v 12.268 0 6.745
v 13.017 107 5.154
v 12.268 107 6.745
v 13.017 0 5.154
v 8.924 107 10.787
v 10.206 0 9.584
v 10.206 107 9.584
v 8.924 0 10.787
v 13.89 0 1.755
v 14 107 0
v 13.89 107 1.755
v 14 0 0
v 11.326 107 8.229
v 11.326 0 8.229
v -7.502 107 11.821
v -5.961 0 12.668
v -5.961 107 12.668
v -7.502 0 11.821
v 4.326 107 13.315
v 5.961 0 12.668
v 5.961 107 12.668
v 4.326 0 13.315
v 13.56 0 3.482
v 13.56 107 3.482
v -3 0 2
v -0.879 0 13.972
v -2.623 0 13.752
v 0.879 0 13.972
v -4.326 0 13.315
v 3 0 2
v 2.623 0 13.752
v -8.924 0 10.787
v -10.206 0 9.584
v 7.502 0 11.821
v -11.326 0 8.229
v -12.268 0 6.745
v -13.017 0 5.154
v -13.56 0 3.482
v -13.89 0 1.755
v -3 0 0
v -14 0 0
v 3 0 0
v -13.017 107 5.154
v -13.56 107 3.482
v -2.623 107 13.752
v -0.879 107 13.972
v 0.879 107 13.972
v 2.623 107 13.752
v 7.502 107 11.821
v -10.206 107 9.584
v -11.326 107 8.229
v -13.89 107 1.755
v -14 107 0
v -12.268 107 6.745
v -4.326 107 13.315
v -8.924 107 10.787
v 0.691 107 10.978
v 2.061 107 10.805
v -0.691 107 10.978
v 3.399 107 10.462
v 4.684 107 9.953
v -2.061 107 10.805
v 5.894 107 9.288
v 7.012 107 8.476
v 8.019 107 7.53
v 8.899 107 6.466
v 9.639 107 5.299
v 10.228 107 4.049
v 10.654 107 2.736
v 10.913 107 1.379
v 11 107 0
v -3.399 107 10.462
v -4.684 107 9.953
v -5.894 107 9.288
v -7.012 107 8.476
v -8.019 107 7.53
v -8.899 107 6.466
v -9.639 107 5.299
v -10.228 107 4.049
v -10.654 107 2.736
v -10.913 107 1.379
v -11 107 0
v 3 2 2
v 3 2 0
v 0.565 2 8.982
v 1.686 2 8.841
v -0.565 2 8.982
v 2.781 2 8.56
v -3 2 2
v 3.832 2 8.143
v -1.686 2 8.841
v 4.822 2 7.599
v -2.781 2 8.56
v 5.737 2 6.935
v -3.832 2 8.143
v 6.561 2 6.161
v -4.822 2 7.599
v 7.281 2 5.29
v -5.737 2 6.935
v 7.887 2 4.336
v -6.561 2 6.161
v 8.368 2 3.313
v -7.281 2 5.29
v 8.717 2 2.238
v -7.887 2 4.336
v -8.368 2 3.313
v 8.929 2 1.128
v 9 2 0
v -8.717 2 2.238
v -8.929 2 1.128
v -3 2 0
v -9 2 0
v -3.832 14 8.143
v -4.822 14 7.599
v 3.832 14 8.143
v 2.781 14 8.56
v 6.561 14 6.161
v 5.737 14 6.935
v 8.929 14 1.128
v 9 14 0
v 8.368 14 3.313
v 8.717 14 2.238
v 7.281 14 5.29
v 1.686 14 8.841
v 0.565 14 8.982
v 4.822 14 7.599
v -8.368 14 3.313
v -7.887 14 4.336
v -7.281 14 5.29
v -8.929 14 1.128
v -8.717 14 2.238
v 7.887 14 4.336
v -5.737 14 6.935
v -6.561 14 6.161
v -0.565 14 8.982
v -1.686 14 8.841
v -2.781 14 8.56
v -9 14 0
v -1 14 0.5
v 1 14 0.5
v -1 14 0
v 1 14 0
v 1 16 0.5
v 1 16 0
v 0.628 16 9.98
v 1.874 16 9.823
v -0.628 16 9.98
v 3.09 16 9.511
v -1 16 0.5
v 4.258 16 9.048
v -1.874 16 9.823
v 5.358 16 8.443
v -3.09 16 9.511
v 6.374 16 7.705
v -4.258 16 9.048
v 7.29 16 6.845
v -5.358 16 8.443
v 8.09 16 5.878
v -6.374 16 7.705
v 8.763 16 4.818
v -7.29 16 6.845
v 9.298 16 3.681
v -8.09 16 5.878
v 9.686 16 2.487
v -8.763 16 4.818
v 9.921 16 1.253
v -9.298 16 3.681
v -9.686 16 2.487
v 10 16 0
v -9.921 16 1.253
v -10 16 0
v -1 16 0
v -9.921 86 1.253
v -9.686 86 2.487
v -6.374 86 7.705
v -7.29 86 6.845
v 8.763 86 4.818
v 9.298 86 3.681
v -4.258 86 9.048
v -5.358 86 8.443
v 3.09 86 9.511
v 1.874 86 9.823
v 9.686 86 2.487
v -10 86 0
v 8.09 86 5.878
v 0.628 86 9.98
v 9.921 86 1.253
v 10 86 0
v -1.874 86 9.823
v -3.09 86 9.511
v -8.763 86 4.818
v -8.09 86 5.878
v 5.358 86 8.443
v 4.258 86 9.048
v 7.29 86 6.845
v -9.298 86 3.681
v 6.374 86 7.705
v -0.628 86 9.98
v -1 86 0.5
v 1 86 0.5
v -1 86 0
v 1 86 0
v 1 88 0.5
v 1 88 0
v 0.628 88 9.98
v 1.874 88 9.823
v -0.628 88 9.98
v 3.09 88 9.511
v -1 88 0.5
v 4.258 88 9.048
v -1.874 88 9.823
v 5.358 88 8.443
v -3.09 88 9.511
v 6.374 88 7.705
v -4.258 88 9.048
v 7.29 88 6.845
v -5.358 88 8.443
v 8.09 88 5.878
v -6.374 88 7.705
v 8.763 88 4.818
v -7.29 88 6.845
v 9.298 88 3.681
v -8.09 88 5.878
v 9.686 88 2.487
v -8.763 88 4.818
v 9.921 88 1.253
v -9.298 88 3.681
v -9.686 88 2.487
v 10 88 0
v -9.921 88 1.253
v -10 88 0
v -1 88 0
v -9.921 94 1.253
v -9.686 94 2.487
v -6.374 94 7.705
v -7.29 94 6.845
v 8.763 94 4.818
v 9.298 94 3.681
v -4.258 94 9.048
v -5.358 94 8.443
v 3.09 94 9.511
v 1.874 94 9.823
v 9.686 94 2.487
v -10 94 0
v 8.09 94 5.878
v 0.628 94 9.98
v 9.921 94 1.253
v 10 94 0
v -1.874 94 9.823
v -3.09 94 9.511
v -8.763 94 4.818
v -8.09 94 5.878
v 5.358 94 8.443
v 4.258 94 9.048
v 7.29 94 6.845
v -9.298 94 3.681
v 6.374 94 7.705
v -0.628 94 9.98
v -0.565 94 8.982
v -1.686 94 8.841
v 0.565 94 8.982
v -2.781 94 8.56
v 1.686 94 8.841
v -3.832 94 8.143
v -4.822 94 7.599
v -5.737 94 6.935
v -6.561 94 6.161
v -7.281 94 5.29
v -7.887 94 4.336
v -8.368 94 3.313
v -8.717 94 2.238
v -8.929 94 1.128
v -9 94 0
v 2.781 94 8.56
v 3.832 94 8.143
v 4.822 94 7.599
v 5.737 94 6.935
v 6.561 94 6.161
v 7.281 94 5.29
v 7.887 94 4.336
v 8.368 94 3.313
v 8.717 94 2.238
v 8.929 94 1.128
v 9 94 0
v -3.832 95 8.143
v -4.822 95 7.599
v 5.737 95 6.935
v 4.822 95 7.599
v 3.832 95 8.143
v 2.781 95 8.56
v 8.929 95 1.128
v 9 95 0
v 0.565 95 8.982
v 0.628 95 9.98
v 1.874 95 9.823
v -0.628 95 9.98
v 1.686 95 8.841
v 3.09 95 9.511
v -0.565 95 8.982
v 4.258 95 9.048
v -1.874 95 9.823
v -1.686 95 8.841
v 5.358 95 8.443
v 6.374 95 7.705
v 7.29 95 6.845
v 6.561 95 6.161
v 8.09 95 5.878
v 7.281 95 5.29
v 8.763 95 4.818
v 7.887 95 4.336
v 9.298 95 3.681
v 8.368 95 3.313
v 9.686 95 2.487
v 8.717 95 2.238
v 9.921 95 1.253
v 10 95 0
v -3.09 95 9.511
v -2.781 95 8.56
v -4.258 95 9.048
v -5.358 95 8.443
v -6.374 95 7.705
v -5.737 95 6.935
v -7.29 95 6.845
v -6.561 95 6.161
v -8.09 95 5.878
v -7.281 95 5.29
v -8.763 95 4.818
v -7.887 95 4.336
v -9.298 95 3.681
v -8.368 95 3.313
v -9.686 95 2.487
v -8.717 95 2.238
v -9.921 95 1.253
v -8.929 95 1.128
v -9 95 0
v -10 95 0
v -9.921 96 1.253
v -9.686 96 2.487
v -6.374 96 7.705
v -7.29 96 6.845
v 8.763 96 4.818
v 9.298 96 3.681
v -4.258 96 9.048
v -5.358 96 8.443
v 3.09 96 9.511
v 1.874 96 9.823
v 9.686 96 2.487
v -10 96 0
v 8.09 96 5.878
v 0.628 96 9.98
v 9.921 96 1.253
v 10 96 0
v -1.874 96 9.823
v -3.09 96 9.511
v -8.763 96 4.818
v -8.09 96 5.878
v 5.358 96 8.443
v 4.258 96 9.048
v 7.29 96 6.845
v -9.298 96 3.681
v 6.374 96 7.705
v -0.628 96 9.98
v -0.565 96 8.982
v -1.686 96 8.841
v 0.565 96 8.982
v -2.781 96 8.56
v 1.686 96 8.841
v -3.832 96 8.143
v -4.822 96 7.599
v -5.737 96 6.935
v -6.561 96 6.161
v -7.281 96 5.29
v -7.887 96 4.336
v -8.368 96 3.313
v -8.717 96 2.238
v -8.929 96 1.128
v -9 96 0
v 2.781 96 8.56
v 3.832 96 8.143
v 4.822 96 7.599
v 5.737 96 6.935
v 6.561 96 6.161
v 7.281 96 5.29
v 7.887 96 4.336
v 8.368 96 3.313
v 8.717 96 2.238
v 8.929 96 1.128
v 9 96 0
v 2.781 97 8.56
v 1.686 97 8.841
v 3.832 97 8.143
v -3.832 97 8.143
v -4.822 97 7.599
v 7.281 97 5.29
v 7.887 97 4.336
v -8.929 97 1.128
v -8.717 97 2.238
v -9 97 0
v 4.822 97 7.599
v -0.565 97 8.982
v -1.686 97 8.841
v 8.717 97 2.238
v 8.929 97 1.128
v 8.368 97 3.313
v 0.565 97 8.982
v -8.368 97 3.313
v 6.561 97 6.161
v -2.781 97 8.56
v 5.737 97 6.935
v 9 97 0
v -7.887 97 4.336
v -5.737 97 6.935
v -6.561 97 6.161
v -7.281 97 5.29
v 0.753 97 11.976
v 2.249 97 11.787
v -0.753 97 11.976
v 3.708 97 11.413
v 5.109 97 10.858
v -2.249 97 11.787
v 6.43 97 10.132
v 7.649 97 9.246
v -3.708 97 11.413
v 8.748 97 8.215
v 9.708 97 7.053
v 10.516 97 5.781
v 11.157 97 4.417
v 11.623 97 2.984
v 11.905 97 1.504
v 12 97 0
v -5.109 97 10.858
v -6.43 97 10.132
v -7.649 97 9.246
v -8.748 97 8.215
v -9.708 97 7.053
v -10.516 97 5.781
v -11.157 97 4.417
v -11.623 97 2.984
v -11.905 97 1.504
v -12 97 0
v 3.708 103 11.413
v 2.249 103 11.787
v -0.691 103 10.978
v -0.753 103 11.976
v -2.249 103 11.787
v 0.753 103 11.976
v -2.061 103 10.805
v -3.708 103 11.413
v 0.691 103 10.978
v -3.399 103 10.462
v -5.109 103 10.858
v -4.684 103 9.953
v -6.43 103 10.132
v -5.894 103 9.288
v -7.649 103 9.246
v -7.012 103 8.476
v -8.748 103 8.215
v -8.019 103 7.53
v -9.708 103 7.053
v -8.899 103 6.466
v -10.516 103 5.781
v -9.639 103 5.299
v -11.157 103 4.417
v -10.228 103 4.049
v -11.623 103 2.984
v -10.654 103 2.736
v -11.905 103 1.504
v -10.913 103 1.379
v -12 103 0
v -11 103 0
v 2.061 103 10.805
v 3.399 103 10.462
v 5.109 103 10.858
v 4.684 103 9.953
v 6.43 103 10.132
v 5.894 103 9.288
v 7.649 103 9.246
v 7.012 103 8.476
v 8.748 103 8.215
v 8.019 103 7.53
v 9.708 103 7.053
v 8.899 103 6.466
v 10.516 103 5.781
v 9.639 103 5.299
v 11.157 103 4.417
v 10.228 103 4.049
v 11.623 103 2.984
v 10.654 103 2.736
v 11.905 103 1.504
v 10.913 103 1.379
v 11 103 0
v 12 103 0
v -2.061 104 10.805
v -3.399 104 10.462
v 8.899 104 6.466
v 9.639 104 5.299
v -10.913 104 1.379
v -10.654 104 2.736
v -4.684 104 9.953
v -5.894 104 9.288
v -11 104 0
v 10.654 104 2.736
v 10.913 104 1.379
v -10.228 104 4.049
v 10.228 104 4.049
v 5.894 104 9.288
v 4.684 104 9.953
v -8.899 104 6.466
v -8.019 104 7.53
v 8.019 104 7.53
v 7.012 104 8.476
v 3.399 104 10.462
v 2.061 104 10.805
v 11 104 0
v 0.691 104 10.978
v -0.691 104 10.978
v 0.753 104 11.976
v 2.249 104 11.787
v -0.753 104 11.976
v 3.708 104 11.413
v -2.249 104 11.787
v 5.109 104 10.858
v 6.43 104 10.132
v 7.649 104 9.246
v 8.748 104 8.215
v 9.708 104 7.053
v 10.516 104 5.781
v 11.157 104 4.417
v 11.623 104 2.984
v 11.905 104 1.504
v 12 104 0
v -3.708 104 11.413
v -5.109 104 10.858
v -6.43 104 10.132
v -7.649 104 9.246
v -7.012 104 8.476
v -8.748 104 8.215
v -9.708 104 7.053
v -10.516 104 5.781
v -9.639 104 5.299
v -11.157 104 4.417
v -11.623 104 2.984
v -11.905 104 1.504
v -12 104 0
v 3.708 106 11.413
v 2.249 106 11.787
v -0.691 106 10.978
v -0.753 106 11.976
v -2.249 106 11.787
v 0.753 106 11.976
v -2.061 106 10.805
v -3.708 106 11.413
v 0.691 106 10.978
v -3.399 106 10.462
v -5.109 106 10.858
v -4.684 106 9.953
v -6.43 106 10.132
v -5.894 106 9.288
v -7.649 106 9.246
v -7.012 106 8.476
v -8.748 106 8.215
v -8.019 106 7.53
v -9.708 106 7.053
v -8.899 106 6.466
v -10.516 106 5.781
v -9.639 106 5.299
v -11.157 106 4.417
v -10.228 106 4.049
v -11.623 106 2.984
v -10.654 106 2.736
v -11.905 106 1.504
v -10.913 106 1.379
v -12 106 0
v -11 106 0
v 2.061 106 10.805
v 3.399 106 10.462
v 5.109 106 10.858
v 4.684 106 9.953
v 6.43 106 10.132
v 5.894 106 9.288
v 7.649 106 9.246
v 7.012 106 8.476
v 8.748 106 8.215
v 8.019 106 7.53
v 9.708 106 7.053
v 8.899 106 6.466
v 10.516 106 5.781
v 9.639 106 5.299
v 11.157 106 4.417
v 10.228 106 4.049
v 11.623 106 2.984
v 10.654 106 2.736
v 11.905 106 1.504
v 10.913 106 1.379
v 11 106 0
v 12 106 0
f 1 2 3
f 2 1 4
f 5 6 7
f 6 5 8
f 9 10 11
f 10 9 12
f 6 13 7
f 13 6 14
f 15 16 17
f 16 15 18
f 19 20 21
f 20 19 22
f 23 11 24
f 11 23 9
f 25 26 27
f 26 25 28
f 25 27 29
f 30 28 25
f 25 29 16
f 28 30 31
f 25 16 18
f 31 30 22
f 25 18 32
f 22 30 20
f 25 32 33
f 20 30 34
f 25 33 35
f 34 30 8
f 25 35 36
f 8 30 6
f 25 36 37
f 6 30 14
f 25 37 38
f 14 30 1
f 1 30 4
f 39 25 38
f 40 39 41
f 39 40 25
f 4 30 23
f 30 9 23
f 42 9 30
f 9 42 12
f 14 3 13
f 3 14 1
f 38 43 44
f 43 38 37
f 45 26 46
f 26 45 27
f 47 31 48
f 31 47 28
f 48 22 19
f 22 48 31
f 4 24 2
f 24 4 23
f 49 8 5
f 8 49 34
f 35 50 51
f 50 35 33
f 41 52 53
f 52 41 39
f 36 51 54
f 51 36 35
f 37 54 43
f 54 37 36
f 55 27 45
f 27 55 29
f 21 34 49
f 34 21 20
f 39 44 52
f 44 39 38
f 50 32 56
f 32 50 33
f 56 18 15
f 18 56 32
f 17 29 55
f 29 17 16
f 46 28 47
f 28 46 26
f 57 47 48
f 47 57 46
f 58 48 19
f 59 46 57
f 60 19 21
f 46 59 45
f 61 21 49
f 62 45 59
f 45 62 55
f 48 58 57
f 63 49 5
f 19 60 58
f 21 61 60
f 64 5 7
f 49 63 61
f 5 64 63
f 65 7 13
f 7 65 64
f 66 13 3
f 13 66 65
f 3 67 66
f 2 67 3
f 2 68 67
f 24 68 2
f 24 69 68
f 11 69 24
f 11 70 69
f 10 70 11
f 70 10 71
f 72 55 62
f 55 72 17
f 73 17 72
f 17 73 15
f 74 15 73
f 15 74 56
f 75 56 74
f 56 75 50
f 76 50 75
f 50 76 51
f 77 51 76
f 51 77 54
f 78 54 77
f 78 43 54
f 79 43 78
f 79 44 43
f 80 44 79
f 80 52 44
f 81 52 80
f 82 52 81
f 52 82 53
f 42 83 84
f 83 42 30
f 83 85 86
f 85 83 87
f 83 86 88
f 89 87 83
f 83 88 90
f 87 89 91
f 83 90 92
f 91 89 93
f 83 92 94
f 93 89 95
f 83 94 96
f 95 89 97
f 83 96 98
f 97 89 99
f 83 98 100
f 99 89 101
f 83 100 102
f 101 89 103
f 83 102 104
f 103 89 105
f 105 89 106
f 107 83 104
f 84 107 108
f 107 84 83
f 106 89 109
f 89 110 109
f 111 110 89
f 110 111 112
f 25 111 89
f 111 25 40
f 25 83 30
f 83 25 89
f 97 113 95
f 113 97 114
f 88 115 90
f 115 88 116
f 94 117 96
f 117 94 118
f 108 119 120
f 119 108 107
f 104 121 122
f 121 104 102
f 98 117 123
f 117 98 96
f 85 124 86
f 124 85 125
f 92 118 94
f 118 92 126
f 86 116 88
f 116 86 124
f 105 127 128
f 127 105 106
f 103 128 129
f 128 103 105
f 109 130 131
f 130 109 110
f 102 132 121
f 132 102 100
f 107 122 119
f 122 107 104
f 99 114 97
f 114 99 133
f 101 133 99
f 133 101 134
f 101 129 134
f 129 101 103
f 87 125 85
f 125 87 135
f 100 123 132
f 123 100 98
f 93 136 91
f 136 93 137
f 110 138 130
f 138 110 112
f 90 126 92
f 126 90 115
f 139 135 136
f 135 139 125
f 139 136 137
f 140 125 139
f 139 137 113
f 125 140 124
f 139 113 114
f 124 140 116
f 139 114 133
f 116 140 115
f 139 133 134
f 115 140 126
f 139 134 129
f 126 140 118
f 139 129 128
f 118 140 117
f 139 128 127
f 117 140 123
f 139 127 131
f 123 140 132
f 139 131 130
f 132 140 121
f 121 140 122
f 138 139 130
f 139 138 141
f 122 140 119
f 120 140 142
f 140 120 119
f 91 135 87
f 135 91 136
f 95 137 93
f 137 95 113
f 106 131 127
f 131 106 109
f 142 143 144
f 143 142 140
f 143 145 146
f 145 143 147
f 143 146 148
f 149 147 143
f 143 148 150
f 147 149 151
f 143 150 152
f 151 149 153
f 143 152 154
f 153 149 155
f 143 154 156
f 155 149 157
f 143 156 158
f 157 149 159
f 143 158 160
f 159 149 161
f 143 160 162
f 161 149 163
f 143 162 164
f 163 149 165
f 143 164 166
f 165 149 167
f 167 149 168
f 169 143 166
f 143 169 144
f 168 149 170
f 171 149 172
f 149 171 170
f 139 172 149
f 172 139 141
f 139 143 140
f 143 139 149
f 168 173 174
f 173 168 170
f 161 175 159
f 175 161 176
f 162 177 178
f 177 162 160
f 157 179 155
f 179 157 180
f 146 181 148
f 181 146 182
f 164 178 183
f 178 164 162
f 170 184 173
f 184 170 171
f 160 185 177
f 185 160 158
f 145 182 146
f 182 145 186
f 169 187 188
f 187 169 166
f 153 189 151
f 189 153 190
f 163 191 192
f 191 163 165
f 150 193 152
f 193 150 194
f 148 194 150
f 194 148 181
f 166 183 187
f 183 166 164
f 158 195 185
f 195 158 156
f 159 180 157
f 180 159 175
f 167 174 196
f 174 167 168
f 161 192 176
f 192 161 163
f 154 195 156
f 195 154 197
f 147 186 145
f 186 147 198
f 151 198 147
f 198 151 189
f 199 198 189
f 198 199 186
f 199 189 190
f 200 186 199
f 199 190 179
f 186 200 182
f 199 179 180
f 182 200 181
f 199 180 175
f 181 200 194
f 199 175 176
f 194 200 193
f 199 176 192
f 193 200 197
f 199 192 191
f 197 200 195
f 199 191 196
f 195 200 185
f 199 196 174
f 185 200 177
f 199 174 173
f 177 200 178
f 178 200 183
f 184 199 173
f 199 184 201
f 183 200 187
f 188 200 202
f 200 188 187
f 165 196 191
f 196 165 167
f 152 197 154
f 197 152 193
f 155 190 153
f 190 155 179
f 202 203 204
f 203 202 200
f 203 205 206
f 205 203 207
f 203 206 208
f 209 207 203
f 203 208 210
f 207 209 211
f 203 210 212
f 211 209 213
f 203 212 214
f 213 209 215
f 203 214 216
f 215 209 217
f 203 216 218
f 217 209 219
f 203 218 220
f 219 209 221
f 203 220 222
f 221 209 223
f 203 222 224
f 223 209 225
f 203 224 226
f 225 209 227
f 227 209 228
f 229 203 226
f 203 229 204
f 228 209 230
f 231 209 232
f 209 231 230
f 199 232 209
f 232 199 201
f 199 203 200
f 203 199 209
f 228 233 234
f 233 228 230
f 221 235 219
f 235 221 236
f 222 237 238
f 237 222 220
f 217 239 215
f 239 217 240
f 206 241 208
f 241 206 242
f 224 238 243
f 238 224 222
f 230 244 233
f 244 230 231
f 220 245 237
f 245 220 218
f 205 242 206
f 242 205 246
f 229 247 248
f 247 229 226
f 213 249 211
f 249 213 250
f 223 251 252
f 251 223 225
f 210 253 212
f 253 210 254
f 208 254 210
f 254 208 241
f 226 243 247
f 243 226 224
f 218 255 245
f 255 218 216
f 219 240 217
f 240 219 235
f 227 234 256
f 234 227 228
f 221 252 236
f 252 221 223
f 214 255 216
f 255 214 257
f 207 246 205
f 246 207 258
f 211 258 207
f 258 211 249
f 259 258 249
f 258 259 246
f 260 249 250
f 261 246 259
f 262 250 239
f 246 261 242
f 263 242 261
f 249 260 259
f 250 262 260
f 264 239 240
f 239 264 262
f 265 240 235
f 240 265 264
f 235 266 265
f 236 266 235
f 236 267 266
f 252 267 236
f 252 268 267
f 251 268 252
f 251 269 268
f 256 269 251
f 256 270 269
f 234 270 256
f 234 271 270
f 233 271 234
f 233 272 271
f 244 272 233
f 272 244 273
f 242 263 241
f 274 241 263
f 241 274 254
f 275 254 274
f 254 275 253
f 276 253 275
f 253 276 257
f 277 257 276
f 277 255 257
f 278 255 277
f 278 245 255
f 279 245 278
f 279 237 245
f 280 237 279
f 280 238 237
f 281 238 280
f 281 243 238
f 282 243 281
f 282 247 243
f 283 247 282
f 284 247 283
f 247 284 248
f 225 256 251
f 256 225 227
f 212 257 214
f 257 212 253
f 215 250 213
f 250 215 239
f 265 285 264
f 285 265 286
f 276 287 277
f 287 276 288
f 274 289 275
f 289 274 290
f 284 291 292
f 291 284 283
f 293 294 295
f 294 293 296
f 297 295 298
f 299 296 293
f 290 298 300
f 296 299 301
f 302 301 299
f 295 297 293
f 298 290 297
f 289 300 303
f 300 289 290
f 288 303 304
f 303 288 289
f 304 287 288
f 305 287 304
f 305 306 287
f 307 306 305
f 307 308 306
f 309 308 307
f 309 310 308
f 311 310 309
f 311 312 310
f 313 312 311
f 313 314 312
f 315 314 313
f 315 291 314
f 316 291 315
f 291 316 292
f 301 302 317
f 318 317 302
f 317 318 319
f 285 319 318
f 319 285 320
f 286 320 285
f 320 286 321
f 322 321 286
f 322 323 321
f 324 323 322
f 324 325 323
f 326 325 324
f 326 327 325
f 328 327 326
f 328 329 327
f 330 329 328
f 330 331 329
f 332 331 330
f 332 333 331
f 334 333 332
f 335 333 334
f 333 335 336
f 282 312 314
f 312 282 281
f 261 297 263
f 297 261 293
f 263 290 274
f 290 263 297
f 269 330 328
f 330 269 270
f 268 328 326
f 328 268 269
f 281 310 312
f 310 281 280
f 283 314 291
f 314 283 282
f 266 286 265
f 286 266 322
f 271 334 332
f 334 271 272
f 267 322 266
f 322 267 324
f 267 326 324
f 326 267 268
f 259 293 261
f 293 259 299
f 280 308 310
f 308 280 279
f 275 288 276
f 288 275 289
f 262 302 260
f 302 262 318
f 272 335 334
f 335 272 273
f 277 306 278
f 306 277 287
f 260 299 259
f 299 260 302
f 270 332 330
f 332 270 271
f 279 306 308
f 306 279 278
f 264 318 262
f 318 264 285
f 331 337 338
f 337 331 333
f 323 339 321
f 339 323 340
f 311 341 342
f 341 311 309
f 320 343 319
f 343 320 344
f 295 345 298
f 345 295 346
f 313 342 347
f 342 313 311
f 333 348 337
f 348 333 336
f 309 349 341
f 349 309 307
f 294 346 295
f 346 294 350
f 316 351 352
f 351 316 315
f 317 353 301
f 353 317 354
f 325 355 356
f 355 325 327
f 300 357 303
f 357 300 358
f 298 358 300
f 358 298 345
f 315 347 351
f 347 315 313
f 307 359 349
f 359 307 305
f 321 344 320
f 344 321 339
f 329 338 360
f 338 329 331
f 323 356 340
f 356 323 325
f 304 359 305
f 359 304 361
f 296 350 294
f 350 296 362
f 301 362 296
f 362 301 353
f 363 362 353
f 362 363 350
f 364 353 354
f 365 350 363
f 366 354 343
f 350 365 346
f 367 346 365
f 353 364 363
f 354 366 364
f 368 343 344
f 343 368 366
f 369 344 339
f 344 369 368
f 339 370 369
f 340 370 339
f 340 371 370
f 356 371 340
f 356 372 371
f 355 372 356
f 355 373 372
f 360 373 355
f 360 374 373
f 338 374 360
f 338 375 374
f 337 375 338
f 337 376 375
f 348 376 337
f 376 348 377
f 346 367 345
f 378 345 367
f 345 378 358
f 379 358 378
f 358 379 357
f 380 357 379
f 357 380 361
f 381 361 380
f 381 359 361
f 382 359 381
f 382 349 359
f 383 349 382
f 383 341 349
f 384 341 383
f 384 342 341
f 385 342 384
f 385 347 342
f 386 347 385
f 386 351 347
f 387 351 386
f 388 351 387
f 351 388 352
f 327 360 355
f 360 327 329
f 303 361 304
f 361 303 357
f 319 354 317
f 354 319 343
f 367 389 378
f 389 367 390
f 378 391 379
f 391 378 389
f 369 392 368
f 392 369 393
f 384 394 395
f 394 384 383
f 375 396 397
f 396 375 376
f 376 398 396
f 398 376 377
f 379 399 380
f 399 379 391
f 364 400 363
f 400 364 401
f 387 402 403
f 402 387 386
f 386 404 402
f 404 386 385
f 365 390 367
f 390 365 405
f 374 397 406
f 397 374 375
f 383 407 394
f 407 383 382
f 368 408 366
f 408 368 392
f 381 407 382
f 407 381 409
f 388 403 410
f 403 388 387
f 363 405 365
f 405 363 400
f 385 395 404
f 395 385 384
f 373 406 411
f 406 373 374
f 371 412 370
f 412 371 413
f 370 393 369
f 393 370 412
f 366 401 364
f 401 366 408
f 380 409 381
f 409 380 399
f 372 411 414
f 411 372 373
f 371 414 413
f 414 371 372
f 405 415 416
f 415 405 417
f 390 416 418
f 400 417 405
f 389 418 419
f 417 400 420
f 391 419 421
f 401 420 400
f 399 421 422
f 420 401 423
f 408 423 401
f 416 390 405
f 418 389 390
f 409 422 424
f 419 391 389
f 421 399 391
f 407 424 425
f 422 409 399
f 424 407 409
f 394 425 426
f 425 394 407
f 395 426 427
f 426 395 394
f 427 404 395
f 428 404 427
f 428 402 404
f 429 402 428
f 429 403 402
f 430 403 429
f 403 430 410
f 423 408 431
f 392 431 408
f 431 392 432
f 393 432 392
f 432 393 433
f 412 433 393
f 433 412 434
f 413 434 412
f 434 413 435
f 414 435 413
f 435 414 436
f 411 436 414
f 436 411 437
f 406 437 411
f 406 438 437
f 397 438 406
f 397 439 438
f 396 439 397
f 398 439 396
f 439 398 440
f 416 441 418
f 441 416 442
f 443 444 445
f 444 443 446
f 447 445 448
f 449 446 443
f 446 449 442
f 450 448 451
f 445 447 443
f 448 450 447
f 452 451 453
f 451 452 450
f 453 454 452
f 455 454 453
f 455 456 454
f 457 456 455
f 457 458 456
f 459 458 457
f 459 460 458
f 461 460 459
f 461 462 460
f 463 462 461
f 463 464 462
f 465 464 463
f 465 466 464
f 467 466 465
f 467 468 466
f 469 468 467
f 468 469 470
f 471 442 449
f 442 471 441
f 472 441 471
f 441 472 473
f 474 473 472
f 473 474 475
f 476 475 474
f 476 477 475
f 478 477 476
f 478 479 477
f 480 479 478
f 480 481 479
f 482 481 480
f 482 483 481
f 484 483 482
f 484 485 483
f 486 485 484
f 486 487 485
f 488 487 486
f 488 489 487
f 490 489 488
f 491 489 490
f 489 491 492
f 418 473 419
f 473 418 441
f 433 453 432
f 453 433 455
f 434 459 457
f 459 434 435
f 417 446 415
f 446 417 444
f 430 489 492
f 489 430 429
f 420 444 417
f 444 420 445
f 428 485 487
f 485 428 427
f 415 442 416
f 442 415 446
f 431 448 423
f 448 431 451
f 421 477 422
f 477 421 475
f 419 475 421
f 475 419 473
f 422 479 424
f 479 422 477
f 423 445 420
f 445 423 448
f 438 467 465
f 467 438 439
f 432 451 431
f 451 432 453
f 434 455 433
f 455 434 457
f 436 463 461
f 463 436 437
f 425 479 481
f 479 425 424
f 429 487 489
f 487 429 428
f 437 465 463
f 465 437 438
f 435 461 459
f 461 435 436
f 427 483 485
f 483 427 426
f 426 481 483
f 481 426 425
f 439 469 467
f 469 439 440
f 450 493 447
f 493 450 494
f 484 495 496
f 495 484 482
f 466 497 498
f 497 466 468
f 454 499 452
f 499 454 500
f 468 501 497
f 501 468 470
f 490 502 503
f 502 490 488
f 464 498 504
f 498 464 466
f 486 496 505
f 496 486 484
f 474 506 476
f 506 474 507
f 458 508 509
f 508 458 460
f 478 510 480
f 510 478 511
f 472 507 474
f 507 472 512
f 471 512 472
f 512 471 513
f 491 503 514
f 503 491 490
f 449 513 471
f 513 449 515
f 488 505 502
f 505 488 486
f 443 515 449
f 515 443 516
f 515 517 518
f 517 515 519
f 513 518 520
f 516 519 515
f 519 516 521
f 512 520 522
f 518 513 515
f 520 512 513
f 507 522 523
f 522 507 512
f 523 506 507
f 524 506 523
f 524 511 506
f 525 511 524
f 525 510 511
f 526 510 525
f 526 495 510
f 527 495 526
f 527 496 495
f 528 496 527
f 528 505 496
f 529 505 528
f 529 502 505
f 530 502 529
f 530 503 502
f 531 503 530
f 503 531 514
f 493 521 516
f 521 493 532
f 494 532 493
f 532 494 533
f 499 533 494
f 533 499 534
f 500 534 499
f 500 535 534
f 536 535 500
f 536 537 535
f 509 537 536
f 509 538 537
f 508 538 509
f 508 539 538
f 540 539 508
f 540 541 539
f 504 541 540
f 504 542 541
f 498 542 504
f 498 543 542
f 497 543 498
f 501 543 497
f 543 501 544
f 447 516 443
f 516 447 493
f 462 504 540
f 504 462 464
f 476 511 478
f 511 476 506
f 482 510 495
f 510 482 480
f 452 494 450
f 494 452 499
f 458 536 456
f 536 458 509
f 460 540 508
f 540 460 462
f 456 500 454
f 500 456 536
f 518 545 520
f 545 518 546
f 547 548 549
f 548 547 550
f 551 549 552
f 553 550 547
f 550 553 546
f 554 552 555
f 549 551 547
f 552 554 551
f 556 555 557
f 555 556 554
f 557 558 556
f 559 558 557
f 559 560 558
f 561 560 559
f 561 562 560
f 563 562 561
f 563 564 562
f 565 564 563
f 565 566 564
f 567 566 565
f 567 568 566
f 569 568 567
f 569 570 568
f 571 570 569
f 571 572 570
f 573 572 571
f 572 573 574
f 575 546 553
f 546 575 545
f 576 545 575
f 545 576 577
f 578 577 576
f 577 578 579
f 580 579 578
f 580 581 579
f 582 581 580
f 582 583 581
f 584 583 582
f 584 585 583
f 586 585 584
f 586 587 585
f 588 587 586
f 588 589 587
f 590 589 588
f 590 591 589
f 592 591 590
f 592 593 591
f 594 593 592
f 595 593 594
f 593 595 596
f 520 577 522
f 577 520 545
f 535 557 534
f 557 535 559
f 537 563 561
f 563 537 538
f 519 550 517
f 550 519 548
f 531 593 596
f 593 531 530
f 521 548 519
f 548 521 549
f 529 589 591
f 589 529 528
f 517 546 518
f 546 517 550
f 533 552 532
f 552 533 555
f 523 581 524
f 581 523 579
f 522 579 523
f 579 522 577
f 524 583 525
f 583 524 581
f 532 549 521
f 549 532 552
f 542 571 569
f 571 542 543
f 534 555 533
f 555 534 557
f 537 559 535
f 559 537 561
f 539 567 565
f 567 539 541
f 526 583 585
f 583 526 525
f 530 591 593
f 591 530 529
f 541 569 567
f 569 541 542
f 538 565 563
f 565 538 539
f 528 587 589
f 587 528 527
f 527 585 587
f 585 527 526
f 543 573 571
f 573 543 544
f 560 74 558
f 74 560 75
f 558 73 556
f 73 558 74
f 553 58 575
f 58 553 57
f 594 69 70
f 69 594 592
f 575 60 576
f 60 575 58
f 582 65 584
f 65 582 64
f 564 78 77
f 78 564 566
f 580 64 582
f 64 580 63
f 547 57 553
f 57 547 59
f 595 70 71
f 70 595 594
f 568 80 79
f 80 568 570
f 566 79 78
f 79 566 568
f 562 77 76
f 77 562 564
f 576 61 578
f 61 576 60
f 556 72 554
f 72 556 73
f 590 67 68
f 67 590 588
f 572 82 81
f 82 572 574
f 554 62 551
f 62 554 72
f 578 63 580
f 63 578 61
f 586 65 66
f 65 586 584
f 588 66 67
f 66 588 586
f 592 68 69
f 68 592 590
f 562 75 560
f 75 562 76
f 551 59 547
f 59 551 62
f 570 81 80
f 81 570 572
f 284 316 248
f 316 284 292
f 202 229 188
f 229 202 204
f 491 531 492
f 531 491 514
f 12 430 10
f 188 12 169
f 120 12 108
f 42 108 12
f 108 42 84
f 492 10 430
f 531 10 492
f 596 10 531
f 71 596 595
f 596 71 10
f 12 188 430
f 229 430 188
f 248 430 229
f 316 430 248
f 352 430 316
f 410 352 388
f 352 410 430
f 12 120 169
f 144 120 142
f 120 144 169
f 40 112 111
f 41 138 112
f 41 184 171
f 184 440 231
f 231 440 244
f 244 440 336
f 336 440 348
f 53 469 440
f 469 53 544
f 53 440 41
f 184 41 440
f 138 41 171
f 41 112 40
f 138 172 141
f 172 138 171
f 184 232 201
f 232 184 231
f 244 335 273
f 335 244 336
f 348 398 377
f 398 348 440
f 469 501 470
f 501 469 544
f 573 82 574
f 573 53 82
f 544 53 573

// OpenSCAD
$fn = 50;

thick=2;

switchlen=12;
switchwid=9;
batterylen=70;
batterywid=9;
airflowlen=6;
airflowwid=10;
pcblen=1;
pcbwid=10;
ledlen=6;
ledwid=12;
lenslen=2;
lenswid=12;

wiredia=1;

notchlen=1;
notchwid=1;

function width() = max(switchwid,batterywid,airflowwid,pcbwid,ledwid,lenswid)+thick;
function length() = thick+switchlen+thick+batterylen+thick+airflowlen+notchlen+pcblen+notchlen+ledlen+notchlen+lenslen+notchlen;

rotate([-90,0,0]) {
  difference() {
    // The outer body
    cylinder(h=length(), r=width());

    // Switch Opening
    translate([-3,-2,0]) {
      cube([6,4,thick]);
    }

    // Switch compartment
    translate([0,0,thick]) {
      cylinder(h=switchlen, r=switchwid);
    }

    // Wire hole
    translate([-wiredia,-wiredia/2,thick+switchlen]) {
      cube([2*wiredia,wiredia,thick]);
    }

    // Battery compartment
    translate([0,0,thick+switchlen+thick]) {
      cylinder(h=batterylen, r=batterywid+wiredia);
    }

    // Wire hole
    translate([-wiredia,-wiredia/2,thick+switchlen+thick+batterylen]) {
      cube([2*wiredia,wiredia,thick]);
    }

    // LED airflow compartment
    translate([0,0,thick+switchlen+thick+batterylen+thick]) {
      cylinder(h=airflowlen, r=airflowwid);
    }

    // PCB
    translate([0,0,thick+switchlen+thick+batterylen+thick+airflowlen]) {
      cylinder(h=1, r=pcbwid-notchwid);
    }
    translate([0,0,thick+switchlen+thick+batterylen+thick+airflowlen+notchlen]) {
      cylinder(h=pcblen, r=pcbwid);
    }
    translate([0,0,thick+switchlen+thick+batterylen+thick+airflowlen+notchlen+pcblen]) {
      cylinder(h=1, r=pcbwid-notchwid);
    }

    // LED compartment
    translate([0,0,thick+switchlen+thick+batterylen+thick+airflowlen+notchlen+pcblen+notchlen]) {
      cylinder(h=ledlen, r=ledwid);
    }

    // Lens
    translate([0,0,thick+switchlen+thick+batterylen+thick+airflowlen+notchlen+pcblen+notchlen+ledlen]) {
      cylinder(h=1, r=lenswid-notchwid);
    }
    translate([0,0,thick+switchlen+thick+batterylen+thick+airflowlen+notchlen+pcblen+notchlen+ledlen+notchlen]) {
      cylinder(h=lenslen, r=lenswid);
    }
    translate([0,0,thick+switchlen+thick+batterylen+thick+airflowlen+notchlen+pcblen+notchlen+ledlen+notchlen+lenslen]) {
      cylinder(h=1, r=lenswid-notchwid);
    }

    // Cleave it in twain
    translate([-width(),0,0]) {
      cube([2*width(),width(),length()]);
    }
  }
}

echo();
echo("***");
echo("STATS:");
echo(str("Final length = ", length(), "mm"));
echo(str("Final width = ", 2*width(), "mm"));
echo("***");
echo();
